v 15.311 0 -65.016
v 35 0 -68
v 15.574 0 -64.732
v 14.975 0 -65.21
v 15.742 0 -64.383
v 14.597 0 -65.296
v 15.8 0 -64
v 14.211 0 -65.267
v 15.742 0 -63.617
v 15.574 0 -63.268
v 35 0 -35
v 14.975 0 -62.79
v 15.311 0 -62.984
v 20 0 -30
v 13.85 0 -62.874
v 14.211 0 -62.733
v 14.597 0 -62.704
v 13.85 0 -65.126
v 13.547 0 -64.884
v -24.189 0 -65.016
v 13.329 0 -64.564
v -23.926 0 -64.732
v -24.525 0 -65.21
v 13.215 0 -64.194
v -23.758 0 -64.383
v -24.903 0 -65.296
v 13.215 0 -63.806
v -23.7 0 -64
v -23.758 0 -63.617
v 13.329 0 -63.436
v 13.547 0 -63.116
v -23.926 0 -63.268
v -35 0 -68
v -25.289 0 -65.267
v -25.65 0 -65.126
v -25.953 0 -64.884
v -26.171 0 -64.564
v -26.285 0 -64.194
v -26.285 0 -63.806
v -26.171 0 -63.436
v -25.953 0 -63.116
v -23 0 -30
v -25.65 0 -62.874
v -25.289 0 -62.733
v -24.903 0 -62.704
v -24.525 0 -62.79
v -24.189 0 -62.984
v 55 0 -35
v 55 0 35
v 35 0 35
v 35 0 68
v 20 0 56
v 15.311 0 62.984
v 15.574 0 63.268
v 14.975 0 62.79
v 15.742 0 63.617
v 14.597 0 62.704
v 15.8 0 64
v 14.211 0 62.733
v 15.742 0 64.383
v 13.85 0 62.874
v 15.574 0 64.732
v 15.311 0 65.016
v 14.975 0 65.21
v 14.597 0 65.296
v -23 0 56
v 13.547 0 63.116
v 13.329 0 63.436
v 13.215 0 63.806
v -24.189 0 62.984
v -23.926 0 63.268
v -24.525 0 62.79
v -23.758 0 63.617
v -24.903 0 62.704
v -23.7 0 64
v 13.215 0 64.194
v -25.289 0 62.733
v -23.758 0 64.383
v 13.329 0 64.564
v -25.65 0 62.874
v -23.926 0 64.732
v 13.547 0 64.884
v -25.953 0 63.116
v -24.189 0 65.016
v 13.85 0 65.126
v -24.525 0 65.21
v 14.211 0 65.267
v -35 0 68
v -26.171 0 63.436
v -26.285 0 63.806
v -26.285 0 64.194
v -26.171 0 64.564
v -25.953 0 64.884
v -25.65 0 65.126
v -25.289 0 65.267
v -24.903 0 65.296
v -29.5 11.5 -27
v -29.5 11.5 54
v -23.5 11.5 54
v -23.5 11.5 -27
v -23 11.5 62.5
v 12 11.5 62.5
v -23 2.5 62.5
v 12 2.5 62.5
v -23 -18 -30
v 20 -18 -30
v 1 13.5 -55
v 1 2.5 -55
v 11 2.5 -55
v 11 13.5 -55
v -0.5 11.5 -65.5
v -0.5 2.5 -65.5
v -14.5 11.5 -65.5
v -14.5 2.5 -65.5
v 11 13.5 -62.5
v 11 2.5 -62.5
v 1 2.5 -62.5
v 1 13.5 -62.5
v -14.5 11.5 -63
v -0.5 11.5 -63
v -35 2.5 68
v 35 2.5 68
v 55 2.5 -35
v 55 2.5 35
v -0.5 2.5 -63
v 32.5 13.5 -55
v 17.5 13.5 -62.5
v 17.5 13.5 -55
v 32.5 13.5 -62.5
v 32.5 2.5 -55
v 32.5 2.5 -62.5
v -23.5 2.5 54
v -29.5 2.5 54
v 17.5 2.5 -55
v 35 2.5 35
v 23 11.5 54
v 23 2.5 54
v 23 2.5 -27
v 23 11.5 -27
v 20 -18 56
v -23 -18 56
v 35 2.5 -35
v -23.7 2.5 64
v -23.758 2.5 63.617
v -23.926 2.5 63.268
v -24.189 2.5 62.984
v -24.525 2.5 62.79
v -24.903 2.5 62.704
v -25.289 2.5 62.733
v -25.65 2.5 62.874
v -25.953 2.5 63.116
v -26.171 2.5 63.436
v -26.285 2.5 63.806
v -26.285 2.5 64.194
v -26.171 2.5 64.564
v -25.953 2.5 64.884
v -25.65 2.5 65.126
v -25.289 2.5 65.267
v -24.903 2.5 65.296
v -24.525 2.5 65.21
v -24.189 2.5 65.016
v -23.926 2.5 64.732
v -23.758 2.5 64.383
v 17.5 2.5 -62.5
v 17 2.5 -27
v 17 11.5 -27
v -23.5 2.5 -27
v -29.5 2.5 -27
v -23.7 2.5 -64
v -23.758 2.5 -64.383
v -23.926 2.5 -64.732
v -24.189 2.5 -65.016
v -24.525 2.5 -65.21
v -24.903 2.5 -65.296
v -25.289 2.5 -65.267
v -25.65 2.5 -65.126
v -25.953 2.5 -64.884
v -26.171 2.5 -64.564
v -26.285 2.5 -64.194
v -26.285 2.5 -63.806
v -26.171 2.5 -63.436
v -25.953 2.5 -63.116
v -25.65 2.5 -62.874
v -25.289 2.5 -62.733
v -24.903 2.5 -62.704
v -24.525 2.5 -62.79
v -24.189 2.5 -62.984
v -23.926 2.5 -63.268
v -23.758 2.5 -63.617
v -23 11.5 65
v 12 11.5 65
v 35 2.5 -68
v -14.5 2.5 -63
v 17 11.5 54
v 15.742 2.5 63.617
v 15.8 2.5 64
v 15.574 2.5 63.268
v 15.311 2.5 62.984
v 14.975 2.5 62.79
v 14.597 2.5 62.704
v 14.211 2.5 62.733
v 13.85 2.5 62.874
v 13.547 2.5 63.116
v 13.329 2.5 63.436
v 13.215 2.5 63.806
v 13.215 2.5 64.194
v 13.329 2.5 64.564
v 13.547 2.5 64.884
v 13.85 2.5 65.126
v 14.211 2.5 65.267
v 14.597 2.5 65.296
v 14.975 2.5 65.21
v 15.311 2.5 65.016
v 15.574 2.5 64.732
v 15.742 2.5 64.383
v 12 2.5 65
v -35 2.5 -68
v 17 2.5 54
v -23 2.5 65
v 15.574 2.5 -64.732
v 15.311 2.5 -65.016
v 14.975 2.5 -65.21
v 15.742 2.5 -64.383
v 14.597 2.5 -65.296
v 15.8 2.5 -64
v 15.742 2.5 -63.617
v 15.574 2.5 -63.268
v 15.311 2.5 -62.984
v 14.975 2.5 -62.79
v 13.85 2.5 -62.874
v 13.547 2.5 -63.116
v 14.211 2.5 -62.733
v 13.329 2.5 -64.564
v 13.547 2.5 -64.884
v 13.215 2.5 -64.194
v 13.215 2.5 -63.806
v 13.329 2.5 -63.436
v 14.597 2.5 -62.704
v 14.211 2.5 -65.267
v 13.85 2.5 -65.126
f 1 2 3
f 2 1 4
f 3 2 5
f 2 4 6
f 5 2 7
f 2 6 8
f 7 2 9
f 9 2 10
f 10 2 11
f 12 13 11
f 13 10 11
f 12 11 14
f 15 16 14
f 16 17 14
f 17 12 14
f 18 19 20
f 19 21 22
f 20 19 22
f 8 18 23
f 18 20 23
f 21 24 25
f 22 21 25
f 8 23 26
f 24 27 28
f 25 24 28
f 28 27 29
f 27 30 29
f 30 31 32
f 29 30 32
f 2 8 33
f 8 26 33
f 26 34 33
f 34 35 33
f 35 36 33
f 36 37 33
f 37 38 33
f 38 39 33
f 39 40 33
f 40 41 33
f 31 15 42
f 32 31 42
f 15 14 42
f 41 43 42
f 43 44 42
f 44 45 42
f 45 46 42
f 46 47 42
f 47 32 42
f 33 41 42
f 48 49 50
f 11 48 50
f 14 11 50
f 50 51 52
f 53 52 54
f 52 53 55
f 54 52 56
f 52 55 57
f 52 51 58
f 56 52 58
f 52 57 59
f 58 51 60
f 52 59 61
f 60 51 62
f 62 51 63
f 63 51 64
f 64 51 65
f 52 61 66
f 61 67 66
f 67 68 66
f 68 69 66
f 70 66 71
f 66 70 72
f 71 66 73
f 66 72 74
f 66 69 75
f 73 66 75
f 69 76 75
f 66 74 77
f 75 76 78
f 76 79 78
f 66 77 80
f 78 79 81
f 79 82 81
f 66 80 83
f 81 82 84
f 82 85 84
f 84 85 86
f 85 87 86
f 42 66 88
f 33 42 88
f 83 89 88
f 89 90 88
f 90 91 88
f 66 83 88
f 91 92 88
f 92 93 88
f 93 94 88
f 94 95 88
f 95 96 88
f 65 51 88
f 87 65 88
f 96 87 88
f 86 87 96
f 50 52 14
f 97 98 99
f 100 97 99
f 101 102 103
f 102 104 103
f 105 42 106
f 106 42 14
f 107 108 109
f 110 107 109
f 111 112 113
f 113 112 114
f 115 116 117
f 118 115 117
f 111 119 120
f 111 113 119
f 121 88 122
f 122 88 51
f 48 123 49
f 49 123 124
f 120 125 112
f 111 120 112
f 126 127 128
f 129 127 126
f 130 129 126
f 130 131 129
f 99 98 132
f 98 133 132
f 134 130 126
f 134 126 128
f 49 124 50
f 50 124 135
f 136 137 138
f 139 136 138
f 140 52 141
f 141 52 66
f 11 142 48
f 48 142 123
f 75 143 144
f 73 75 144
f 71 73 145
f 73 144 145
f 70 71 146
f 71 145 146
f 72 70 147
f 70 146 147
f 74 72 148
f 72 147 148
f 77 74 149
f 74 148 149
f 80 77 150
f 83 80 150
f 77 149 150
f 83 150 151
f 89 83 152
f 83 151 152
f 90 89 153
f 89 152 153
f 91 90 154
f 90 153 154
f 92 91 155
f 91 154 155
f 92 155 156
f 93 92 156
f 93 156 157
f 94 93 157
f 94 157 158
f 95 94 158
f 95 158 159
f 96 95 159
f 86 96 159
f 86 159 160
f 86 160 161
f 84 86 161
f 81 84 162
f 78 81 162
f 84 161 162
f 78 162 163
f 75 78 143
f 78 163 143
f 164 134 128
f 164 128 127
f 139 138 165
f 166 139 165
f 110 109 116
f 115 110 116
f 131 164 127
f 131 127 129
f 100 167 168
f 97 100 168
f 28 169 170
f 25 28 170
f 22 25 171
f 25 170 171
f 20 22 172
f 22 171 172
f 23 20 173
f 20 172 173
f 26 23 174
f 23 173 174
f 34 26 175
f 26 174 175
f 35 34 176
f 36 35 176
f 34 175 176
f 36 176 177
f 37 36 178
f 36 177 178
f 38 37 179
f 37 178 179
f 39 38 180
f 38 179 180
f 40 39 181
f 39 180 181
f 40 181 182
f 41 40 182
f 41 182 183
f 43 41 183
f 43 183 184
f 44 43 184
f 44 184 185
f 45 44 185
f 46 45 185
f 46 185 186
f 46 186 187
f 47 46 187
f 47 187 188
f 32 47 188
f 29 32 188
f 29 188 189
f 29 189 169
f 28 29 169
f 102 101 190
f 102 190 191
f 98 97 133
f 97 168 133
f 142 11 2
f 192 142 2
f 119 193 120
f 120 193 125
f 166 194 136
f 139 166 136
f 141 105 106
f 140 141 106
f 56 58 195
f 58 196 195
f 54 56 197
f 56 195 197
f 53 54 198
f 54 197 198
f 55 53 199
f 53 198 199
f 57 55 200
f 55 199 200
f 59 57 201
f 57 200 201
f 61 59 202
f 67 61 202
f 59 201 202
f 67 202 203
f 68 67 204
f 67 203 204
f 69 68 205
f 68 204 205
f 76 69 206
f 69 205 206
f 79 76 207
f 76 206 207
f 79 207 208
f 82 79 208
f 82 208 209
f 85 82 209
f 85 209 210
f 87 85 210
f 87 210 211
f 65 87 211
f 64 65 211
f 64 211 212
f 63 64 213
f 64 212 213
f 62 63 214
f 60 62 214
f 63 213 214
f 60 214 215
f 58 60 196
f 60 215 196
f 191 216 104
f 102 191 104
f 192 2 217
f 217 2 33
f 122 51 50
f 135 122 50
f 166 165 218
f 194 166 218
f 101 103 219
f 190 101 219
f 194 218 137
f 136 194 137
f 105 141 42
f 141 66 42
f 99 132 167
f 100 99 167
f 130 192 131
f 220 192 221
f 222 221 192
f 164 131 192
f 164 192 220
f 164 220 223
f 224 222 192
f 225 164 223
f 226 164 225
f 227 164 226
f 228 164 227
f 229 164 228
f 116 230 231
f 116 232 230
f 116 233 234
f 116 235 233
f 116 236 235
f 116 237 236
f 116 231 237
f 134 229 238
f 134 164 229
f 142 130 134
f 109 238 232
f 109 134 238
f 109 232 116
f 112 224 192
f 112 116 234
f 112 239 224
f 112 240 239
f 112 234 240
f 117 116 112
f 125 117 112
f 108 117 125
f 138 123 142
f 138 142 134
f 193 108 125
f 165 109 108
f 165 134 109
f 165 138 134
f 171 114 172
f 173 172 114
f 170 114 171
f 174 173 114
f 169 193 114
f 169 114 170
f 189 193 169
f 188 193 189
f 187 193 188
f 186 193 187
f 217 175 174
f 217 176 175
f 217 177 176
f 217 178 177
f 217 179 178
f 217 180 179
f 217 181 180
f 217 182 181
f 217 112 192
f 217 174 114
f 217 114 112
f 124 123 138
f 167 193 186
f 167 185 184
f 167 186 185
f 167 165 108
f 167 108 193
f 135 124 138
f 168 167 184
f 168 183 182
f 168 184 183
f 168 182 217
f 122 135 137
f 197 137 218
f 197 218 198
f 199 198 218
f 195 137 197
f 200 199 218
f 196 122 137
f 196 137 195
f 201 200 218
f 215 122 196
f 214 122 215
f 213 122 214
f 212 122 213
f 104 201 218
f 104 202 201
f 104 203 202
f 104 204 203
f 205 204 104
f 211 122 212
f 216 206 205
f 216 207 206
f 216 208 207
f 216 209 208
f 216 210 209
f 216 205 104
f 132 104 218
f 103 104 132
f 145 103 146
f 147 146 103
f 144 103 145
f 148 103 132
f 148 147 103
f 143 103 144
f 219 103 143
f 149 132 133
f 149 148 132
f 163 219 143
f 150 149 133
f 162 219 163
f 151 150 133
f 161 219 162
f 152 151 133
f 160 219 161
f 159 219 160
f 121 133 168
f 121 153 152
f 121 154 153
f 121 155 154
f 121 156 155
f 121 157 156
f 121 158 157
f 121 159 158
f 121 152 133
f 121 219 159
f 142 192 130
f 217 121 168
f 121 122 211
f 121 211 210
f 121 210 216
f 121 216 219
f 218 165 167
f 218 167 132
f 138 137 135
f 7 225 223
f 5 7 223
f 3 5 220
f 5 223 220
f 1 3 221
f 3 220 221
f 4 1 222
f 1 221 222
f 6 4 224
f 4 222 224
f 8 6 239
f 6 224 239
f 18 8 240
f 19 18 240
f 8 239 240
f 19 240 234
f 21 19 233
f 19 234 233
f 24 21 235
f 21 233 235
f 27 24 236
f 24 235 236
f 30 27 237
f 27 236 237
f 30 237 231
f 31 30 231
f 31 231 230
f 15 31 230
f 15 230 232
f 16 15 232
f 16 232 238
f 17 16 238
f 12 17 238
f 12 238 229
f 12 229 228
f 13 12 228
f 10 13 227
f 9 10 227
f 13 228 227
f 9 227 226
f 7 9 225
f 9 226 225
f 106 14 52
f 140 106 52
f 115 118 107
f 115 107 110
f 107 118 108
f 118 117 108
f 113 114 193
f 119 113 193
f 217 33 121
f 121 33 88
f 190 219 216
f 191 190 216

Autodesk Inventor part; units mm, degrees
ref_plane "YZ Plane" through (0, 0, 0) normal (1, 0, 0) x (0, 1, 0)
ref_plane "XZ Plane" through (0, 0, 0) normal (0, 1, 0) x (-1, 0, 0)
ref_plane "XY Plane" through (0, 0, 0) normal (0, 0, 1) x (1, 0, 0)
sketch "Szkic1" plane through (0, 0, 0) normal (0, 1, 0) x (-1, 0, 0)
  line L0 (-35, -68) -> (35, -68)
  line L1 (35, -68) -> (35, 68)
  line L2 (35, 68) -> (-35, 68)
  line L3 (-35, 68) -> (-35, -68)
  line L4 (-35, -68) -> (35, 68) construction
  line L5 (35, -68) -> (-35, 68) construction
  point P0 (0, 0)
  dimension "d0" = 70
  dimension "d1" = 136
extrude "Wyciągnięcie proste1" add sketch "Szkic1" along normal blind 2.5
sketch "Szkic2" plane through (0, 2.5, 0) normal (0, 1, 0) x (1, 0, 0)
  line L0 (-52.8, 0) -> (71.8, 0) projected
  line L1 (35, -68) -> (35, 68) projected
  line L2 (55, -35) -> (35, -35)
  line L3 (35, -35) -> (35, 35)
  line L4 (35, 35) -> (55, 35)
  line L5 (55, 35) -> (55, -35)
  line L6 (55, -35) -> (35, 35) construction
  line L7 (35, -35) -> (55, 35) construction
  point P0 (0, 0)
  point P1 (45, 0)
  dimension "d4" = 20
  dimension "d5" = 70
extrude "Wyciągnięcie proste2" add sketch "Szkic2" against normal up to surface (2.5 mm away)
sketch "Szkic3" plane through (0, 2.5, 0) normal (0, 1, 0) x (1, 0, 0)
  circle A0 centre (-25, 64) radius 1.3
  line L0 (35, 68) -> (-35, 68) projected
  line L1 (-35, -68) -> (35, -68) projected
  line L2 (-35, 68) -> (-35, -68) projected
  circle A1 centre (14.5, 64) radius 1.3
  circle A2 centre (-25, -64) radius 1.3
  circle A3 centre (14.5, -64) radius 1.3
  point P0 (0, 0)
  dimension "d8" = 2.6
  dimension "d9" = 4
  dimension "d10" = 136
  dimension "d13" = 39.5
  dimension "d16" = 128
  dimension "d19" = 10
extrude "Wyciągnięcie proste3" cut sketch "Szkic3" against normal up to next
sketch "Szkic4" plane through (0, 2.5, 0) normal (0, 1, 0) x (1, 0, 0)
  line L0 (-23, -65) -> (12, -65)
  line L1 (12, -65) -> (12, -62.5)
  line L2 (12, -62.5) -> (-23, -62.5)
  line L3 (-23, -62.5) -> (-23, -65)
  line L4 (-23, -65) -> (12, -62.5) construction
  line L5 (12, -65) -> (-23, -62.5) construction
  line L6 (-35, -68) -> (35, -68) projected
  line L7 (-35, 68) -> (-35, -68) projected
  point P0 (0, 0)
  point P1 (-5.5, -63.75)
  dimension "d22" = 35
  dimension "d23" = 2.5
  dimension "d24" = 3
  dimension "d25" = 12
extrude "Wyciągnięcie proste4" add sketch "Szkic4" along normal blind 9
sketch "Szkic5" plane through (0, 2.5, 0) normal (0, 1, 0) x (1, 0, 0)
  line L0 (-29.5, -54) -> (-23.5, -54)
  line L1 (-23.5, -54) -> (-23.5, 27)
  line L2 (-23.5, 27) -> (-29.5, 27)
  line L3 (-29.5, 27) -> (-29.5, -54)
  line L4 (-29.5, -54) -> (-23.5, 27) construction
  line L5 (-23.5, -54) -> (-29.5, 27) construction
  line L6 (-35, -68) -> (35, -68) projected
  line L7 (-35, 68) -> (-35, -68) projected
  line L8 (17, -54) -> (23, -54)
  line L9 (23, -54) -> (23, 27)
  line L10 (23, 27) -> (17, 27)
  line L11 (17, 27) -> (17, -54)
  line L12 (17, -54) -> (23, 27) construction
  line L13 (23, -54) -> (17, 27) construction
  line L14 (35, -68) -> (35, -35) projected
  point P0 (0, 0)
  point P1 (-26.5, -13.5)
  point P2 (20, -13.5)
  dimension "d28" = 6
  dimension "d29" = 81
  dimension "d30" = 14
  dimension "d31" = 5.5
  dimension "d32" = 6
  dimension "d33" = 81
  dimension "d34" = 14
  dimension "d35" = 12
extrude "Wyciągnięcie proste5" add sketch "Szkic5" along normal blind 9
sketch "Szkic6" plane through (0, 2.5, 0) normal (0, 1, 0) x (1, 0, 0)
  line L0 (32.5, 55) -> (17.5, 55)
  line L1 (17.5, 55) -> (17.5, 62.5)
  line L2 (17.5, 62.5) -> (32.5, 62.5)
  line L3 (32.5, 62.5) -> (32.5, 55)
  line L4 (32.5, 55) -> (17.5, 62.5) construction
  line L5 (17.5, 55) -> (32.5, 62.5) construction
  line L6 (11, 62.5) -> (1, 62.5)
  line L7 (1, 62.5) -> (1, 55)
  line L8 (1, 55) -> (11, 55)
  line L9 (11, 55) -> (11, 62.5)
  line L10 (11, 62.5) -> (1, 55) construction
  line L11 (1, 62.5) -> (11, 55) construction
  line L12 (35, 35) -> (35, 68) projected
  line L13 (35, 68) -> (-35, 68) projected
  point P0 (0, 0)
  point P1 (25, 58.75)
  point P2 (6, 58.75)
  dimension "d38" = 15
  dimension "d39" = 7.5
  dimension "d40" = 10
  dimension "d41" = 7.5
  dimension "d42" = 6.5
  dimension "d43" = 2.5
  dimension "d44" = 5.5
  dimension "d45" = 5.5
extrude "Wyciągnięcie proste6" add sketch "Szkic6" along normal blind 11
sketch "Szkic7" plane through (0, 2.5, 0) normal (0, 1, 0) x (1, 0, 0)
  line L0 (-0.5, 65.5) -> (-14.5, 65.5)
  line L1 (-14.5, 65.5) -> (-14.5, 63)
  line L2 (-14.5, 63) -> (-0.5, 63)
  line L3 (-0.5, 63) -> (-0.5, 65.5)
  line L4 (-0.5, 65.5) -> (-14.5, 63) construction
  line L5 (-14.5, 65.5) -> (-0.5, 63) construction
  line L6 (35, 68) -> (-35, 68) projected
  line L7 (-35, 68) -> (-35, -68) projected
  point P0 (0, 0)
  point P1 (-7.5, 64.25)
  dimension "d48" = 14
  dimension "d49" = 2.5
  dimension "d50" = 2.5
  dimension "d51" = 20.5
extrude "Wyciągnięcie proste7" add sketch "Szkic7" along normal blind 9
sketch "Szkic8" plane through (0, 0, 0) normal (0, -1, 0) x (1, 0, 0)
  line L0 (20, 56) -> (-23, 56)
  line L1 (-23, 56) -> (-23, -30)
  line L2 (-23, -30) -> (20, -30)
  line L3 (20, -30) -> (20, 56)
  line L4 (20, 56) -> (-23, -30) construction
  line L5 (-23, 56) -> (20, -30) construction
  line L6 (-35, 68) -> (35, 68) projected
  line L7 (-35, -68) -> (-35, 68) projected
  point P0 (0, 0)
  point P1 (-1.5, 13)
  dimension "d54" = 43
  dimension "d55" = 86
  dimension "d56" = 12
  dimension "d57" = 12
extrude "Wyciągnięcie proste8" add sketch "Szkic8" along normal blind 18
equation "\"d16\" = d10 - 2 * d9"
equation "\"d45\" = d44"
properties part number "pcb"
